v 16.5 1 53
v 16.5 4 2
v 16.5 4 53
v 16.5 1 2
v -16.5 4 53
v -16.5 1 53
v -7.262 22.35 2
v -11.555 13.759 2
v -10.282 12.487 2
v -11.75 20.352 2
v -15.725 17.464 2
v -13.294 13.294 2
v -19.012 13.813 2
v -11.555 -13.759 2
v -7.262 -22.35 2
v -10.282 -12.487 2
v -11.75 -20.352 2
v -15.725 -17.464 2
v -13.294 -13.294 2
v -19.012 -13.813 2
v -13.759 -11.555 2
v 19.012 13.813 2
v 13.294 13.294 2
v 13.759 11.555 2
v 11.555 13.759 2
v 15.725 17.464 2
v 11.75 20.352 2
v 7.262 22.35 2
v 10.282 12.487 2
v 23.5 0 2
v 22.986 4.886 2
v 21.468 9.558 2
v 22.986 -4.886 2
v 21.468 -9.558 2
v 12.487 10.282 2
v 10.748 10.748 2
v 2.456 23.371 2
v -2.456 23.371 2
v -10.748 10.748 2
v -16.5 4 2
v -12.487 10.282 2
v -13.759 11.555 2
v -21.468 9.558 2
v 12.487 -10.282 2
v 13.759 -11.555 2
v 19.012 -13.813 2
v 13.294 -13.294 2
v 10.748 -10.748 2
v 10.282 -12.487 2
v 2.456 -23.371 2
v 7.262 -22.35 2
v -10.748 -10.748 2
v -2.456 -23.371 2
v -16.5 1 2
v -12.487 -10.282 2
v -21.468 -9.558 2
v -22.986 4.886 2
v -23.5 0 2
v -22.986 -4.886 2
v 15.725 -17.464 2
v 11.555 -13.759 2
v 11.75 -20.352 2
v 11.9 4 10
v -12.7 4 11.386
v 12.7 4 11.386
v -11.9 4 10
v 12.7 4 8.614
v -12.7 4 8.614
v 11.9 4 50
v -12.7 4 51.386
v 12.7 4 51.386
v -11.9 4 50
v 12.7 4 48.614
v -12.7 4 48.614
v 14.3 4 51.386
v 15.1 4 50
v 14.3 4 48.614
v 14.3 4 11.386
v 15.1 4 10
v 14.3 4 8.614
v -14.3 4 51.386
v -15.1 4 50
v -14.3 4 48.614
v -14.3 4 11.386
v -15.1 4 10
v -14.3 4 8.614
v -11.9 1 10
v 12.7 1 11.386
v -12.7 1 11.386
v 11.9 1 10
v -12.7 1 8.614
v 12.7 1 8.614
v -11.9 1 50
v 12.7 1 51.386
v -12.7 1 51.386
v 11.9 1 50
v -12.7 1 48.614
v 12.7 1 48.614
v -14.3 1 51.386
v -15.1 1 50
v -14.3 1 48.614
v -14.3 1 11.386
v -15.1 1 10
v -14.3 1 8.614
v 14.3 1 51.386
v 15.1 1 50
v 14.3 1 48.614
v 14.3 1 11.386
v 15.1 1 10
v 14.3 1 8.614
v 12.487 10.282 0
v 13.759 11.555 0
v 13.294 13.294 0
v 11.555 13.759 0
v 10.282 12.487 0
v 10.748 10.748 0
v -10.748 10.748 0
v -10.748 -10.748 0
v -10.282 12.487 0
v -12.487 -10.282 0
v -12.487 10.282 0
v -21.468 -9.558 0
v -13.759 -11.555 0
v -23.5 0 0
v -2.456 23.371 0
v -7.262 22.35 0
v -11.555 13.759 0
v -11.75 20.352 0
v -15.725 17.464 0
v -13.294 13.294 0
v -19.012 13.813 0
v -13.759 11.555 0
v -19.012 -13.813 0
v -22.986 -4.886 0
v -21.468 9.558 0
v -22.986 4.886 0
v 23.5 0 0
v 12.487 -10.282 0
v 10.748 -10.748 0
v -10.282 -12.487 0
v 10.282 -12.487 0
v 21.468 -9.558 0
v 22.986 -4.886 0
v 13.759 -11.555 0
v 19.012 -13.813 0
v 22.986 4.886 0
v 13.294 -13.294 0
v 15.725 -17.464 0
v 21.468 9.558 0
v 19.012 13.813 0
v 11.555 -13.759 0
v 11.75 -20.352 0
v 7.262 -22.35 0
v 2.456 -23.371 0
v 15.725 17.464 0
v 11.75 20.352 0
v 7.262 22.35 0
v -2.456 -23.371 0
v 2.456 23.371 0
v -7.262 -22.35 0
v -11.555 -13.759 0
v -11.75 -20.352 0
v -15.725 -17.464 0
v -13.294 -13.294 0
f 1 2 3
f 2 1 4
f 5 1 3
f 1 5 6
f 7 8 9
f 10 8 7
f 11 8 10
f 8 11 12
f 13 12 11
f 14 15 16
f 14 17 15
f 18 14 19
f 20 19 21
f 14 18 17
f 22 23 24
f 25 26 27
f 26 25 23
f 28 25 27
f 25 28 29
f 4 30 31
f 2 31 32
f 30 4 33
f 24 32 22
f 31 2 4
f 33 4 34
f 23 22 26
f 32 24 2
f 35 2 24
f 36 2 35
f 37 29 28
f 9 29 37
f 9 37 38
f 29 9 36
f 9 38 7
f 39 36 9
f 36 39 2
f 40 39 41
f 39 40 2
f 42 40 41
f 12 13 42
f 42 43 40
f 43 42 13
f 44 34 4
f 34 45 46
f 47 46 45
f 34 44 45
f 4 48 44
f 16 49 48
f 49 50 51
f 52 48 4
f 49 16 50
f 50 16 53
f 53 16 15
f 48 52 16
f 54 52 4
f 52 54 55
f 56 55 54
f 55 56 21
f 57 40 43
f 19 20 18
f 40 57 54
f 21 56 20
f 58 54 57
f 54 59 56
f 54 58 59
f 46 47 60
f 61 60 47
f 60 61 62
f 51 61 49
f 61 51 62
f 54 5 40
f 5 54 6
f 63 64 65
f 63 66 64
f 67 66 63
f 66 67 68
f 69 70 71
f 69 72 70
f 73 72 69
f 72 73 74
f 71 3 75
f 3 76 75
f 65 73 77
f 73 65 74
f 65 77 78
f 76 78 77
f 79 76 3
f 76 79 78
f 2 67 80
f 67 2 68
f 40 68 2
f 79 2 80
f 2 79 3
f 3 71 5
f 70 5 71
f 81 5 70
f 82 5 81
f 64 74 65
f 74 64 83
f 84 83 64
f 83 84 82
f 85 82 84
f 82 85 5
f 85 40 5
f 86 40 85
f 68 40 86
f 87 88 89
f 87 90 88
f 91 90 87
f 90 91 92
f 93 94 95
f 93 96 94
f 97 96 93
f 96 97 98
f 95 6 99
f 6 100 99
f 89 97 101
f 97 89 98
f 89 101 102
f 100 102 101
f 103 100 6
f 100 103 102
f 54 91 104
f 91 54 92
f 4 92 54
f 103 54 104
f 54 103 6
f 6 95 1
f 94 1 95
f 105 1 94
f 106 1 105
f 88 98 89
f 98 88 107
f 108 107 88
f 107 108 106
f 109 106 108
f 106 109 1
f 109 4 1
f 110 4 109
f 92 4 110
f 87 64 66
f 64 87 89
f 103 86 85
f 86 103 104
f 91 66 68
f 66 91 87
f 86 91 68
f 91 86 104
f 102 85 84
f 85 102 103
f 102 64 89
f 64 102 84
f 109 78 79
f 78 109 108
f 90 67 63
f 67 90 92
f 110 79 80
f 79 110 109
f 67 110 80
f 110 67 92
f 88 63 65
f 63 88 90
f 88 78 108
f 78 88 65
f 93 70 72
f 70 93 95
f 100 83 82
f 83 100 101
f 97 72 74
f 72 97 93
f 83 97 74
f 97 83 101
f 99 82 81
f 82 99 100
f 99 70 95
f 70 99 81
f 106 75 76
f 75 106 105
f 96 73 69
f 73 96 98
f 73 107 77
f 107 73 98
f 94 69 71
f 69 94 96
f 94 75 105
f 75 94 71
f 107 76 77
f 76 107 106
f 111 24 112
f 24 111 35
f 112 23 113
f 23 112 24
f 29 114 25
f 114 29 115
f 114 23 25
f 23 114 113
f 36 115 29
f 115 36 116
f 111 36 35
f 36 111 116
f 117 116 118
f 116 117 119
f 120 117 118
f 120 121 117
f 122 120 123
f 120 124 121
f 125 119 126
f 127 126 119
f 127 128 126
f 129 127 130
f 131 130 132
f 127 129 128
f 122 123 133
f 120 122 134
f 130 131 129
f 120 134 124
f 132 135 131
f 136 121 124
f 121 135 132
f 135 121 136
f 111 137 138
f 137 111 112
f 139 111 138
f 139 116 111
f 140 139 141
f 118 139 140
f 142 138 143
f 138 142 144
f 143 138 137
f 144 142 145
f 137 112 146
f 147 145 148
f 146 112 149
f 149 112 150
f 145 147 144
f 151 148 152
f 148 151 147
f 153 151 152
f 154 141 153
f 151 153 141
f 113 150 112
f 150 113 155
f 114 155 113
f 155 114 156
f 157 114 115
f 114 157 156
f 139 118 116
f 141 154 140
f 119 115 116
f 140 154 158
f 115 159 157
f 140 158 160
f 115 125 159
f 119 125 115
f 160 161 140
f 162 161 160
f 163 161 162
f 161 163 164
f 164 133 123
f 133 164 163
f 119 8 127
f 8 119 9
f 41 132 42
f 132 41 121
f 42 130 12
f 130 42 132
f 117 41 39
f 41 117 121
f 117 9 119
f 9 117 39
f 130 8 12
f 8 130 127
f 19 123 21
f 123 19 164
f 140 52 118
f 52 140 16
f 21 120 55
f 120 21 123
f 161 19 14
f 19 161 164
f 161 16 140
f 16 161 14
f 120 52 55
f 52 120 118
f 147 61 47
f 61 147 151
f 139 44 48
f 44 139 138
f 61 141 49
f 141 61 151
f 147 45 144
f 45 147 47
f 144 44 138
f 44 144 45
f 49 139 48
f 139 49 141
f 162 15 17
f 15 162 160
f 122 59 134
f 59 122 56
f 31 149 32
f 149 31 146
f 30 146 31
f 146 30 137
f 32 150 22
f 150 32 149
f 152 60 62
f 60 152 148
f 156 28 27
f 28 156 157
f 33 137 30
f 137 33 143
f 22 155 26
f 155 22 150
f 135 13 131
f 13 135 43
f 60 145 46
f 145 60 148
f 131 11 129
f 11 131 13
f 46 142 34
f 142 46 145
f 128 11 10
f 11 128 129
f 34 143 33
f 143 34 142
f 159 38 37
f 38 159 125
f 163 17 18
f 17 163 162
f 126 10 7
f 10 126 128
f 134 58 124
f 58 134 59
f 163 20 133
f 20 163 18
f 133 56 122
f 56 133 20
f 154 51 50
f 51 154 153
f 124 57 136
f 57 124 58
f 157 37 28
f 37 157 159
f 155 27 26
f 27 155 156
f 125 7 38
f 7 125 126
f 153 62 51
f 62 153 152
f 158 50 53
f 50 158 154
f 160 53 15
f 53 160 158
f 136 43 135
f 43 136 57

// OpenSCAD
bignum = 999;
smallnum=0.001;
boardheight = 1;
holderx=46;
holdery=33;
holderz=3;
plateheight=2;
boardheight=1;
holeinset=3;
extrashift=5;

difference(){
    translate([-holdery/2,boardheight,plateheight]) 
        cube([holdery,holderz,holderx+extrashift]);
      

    translate([-holdery/2+holeinset,bignum/2,plateheight+holeinset+extrashift]) rotate([90,0,0]) cylinder(r=1.6, h=bignum);
    translate([+holdery/2-holeinset,bignum/2,plateheight+holeinset+extrashift]) rotate([90,0,0]) cylinder(r=1.6, h=bignum);
    translate([-holdery/2+holeinset,bignum/2,holderx+plateheight+extrashift-holeinset]) rotate([90,0,0]) cylinder(r=1.6, h=bignum);
    translate([+holdery/2-holeinset,bignum/2,holderx+plateheight+extrashift-holeinset]) rotate([90,0,0]) cylinder(r=1.6, h=bignum);
}


difference(){
    cylinder(h=plateheight, r=(47/2));
  
    rotate([0,0,45])union(){
        rotate([0,0,0]) translate([17,0,0]) cylinder(r=1.8, h=bignum);
        rotate([0,0,90]) translate([17,0,0]) cylinder(r=1.8, h=bignum);
        rotate([0,0,180]) translate([17,0,0]) cylinder(r=1.8, h=bignum);
        rotate([0,0,270]) translate([17,0,0]) cylinder(r=1.8, h=bignum);
        }
    
}
